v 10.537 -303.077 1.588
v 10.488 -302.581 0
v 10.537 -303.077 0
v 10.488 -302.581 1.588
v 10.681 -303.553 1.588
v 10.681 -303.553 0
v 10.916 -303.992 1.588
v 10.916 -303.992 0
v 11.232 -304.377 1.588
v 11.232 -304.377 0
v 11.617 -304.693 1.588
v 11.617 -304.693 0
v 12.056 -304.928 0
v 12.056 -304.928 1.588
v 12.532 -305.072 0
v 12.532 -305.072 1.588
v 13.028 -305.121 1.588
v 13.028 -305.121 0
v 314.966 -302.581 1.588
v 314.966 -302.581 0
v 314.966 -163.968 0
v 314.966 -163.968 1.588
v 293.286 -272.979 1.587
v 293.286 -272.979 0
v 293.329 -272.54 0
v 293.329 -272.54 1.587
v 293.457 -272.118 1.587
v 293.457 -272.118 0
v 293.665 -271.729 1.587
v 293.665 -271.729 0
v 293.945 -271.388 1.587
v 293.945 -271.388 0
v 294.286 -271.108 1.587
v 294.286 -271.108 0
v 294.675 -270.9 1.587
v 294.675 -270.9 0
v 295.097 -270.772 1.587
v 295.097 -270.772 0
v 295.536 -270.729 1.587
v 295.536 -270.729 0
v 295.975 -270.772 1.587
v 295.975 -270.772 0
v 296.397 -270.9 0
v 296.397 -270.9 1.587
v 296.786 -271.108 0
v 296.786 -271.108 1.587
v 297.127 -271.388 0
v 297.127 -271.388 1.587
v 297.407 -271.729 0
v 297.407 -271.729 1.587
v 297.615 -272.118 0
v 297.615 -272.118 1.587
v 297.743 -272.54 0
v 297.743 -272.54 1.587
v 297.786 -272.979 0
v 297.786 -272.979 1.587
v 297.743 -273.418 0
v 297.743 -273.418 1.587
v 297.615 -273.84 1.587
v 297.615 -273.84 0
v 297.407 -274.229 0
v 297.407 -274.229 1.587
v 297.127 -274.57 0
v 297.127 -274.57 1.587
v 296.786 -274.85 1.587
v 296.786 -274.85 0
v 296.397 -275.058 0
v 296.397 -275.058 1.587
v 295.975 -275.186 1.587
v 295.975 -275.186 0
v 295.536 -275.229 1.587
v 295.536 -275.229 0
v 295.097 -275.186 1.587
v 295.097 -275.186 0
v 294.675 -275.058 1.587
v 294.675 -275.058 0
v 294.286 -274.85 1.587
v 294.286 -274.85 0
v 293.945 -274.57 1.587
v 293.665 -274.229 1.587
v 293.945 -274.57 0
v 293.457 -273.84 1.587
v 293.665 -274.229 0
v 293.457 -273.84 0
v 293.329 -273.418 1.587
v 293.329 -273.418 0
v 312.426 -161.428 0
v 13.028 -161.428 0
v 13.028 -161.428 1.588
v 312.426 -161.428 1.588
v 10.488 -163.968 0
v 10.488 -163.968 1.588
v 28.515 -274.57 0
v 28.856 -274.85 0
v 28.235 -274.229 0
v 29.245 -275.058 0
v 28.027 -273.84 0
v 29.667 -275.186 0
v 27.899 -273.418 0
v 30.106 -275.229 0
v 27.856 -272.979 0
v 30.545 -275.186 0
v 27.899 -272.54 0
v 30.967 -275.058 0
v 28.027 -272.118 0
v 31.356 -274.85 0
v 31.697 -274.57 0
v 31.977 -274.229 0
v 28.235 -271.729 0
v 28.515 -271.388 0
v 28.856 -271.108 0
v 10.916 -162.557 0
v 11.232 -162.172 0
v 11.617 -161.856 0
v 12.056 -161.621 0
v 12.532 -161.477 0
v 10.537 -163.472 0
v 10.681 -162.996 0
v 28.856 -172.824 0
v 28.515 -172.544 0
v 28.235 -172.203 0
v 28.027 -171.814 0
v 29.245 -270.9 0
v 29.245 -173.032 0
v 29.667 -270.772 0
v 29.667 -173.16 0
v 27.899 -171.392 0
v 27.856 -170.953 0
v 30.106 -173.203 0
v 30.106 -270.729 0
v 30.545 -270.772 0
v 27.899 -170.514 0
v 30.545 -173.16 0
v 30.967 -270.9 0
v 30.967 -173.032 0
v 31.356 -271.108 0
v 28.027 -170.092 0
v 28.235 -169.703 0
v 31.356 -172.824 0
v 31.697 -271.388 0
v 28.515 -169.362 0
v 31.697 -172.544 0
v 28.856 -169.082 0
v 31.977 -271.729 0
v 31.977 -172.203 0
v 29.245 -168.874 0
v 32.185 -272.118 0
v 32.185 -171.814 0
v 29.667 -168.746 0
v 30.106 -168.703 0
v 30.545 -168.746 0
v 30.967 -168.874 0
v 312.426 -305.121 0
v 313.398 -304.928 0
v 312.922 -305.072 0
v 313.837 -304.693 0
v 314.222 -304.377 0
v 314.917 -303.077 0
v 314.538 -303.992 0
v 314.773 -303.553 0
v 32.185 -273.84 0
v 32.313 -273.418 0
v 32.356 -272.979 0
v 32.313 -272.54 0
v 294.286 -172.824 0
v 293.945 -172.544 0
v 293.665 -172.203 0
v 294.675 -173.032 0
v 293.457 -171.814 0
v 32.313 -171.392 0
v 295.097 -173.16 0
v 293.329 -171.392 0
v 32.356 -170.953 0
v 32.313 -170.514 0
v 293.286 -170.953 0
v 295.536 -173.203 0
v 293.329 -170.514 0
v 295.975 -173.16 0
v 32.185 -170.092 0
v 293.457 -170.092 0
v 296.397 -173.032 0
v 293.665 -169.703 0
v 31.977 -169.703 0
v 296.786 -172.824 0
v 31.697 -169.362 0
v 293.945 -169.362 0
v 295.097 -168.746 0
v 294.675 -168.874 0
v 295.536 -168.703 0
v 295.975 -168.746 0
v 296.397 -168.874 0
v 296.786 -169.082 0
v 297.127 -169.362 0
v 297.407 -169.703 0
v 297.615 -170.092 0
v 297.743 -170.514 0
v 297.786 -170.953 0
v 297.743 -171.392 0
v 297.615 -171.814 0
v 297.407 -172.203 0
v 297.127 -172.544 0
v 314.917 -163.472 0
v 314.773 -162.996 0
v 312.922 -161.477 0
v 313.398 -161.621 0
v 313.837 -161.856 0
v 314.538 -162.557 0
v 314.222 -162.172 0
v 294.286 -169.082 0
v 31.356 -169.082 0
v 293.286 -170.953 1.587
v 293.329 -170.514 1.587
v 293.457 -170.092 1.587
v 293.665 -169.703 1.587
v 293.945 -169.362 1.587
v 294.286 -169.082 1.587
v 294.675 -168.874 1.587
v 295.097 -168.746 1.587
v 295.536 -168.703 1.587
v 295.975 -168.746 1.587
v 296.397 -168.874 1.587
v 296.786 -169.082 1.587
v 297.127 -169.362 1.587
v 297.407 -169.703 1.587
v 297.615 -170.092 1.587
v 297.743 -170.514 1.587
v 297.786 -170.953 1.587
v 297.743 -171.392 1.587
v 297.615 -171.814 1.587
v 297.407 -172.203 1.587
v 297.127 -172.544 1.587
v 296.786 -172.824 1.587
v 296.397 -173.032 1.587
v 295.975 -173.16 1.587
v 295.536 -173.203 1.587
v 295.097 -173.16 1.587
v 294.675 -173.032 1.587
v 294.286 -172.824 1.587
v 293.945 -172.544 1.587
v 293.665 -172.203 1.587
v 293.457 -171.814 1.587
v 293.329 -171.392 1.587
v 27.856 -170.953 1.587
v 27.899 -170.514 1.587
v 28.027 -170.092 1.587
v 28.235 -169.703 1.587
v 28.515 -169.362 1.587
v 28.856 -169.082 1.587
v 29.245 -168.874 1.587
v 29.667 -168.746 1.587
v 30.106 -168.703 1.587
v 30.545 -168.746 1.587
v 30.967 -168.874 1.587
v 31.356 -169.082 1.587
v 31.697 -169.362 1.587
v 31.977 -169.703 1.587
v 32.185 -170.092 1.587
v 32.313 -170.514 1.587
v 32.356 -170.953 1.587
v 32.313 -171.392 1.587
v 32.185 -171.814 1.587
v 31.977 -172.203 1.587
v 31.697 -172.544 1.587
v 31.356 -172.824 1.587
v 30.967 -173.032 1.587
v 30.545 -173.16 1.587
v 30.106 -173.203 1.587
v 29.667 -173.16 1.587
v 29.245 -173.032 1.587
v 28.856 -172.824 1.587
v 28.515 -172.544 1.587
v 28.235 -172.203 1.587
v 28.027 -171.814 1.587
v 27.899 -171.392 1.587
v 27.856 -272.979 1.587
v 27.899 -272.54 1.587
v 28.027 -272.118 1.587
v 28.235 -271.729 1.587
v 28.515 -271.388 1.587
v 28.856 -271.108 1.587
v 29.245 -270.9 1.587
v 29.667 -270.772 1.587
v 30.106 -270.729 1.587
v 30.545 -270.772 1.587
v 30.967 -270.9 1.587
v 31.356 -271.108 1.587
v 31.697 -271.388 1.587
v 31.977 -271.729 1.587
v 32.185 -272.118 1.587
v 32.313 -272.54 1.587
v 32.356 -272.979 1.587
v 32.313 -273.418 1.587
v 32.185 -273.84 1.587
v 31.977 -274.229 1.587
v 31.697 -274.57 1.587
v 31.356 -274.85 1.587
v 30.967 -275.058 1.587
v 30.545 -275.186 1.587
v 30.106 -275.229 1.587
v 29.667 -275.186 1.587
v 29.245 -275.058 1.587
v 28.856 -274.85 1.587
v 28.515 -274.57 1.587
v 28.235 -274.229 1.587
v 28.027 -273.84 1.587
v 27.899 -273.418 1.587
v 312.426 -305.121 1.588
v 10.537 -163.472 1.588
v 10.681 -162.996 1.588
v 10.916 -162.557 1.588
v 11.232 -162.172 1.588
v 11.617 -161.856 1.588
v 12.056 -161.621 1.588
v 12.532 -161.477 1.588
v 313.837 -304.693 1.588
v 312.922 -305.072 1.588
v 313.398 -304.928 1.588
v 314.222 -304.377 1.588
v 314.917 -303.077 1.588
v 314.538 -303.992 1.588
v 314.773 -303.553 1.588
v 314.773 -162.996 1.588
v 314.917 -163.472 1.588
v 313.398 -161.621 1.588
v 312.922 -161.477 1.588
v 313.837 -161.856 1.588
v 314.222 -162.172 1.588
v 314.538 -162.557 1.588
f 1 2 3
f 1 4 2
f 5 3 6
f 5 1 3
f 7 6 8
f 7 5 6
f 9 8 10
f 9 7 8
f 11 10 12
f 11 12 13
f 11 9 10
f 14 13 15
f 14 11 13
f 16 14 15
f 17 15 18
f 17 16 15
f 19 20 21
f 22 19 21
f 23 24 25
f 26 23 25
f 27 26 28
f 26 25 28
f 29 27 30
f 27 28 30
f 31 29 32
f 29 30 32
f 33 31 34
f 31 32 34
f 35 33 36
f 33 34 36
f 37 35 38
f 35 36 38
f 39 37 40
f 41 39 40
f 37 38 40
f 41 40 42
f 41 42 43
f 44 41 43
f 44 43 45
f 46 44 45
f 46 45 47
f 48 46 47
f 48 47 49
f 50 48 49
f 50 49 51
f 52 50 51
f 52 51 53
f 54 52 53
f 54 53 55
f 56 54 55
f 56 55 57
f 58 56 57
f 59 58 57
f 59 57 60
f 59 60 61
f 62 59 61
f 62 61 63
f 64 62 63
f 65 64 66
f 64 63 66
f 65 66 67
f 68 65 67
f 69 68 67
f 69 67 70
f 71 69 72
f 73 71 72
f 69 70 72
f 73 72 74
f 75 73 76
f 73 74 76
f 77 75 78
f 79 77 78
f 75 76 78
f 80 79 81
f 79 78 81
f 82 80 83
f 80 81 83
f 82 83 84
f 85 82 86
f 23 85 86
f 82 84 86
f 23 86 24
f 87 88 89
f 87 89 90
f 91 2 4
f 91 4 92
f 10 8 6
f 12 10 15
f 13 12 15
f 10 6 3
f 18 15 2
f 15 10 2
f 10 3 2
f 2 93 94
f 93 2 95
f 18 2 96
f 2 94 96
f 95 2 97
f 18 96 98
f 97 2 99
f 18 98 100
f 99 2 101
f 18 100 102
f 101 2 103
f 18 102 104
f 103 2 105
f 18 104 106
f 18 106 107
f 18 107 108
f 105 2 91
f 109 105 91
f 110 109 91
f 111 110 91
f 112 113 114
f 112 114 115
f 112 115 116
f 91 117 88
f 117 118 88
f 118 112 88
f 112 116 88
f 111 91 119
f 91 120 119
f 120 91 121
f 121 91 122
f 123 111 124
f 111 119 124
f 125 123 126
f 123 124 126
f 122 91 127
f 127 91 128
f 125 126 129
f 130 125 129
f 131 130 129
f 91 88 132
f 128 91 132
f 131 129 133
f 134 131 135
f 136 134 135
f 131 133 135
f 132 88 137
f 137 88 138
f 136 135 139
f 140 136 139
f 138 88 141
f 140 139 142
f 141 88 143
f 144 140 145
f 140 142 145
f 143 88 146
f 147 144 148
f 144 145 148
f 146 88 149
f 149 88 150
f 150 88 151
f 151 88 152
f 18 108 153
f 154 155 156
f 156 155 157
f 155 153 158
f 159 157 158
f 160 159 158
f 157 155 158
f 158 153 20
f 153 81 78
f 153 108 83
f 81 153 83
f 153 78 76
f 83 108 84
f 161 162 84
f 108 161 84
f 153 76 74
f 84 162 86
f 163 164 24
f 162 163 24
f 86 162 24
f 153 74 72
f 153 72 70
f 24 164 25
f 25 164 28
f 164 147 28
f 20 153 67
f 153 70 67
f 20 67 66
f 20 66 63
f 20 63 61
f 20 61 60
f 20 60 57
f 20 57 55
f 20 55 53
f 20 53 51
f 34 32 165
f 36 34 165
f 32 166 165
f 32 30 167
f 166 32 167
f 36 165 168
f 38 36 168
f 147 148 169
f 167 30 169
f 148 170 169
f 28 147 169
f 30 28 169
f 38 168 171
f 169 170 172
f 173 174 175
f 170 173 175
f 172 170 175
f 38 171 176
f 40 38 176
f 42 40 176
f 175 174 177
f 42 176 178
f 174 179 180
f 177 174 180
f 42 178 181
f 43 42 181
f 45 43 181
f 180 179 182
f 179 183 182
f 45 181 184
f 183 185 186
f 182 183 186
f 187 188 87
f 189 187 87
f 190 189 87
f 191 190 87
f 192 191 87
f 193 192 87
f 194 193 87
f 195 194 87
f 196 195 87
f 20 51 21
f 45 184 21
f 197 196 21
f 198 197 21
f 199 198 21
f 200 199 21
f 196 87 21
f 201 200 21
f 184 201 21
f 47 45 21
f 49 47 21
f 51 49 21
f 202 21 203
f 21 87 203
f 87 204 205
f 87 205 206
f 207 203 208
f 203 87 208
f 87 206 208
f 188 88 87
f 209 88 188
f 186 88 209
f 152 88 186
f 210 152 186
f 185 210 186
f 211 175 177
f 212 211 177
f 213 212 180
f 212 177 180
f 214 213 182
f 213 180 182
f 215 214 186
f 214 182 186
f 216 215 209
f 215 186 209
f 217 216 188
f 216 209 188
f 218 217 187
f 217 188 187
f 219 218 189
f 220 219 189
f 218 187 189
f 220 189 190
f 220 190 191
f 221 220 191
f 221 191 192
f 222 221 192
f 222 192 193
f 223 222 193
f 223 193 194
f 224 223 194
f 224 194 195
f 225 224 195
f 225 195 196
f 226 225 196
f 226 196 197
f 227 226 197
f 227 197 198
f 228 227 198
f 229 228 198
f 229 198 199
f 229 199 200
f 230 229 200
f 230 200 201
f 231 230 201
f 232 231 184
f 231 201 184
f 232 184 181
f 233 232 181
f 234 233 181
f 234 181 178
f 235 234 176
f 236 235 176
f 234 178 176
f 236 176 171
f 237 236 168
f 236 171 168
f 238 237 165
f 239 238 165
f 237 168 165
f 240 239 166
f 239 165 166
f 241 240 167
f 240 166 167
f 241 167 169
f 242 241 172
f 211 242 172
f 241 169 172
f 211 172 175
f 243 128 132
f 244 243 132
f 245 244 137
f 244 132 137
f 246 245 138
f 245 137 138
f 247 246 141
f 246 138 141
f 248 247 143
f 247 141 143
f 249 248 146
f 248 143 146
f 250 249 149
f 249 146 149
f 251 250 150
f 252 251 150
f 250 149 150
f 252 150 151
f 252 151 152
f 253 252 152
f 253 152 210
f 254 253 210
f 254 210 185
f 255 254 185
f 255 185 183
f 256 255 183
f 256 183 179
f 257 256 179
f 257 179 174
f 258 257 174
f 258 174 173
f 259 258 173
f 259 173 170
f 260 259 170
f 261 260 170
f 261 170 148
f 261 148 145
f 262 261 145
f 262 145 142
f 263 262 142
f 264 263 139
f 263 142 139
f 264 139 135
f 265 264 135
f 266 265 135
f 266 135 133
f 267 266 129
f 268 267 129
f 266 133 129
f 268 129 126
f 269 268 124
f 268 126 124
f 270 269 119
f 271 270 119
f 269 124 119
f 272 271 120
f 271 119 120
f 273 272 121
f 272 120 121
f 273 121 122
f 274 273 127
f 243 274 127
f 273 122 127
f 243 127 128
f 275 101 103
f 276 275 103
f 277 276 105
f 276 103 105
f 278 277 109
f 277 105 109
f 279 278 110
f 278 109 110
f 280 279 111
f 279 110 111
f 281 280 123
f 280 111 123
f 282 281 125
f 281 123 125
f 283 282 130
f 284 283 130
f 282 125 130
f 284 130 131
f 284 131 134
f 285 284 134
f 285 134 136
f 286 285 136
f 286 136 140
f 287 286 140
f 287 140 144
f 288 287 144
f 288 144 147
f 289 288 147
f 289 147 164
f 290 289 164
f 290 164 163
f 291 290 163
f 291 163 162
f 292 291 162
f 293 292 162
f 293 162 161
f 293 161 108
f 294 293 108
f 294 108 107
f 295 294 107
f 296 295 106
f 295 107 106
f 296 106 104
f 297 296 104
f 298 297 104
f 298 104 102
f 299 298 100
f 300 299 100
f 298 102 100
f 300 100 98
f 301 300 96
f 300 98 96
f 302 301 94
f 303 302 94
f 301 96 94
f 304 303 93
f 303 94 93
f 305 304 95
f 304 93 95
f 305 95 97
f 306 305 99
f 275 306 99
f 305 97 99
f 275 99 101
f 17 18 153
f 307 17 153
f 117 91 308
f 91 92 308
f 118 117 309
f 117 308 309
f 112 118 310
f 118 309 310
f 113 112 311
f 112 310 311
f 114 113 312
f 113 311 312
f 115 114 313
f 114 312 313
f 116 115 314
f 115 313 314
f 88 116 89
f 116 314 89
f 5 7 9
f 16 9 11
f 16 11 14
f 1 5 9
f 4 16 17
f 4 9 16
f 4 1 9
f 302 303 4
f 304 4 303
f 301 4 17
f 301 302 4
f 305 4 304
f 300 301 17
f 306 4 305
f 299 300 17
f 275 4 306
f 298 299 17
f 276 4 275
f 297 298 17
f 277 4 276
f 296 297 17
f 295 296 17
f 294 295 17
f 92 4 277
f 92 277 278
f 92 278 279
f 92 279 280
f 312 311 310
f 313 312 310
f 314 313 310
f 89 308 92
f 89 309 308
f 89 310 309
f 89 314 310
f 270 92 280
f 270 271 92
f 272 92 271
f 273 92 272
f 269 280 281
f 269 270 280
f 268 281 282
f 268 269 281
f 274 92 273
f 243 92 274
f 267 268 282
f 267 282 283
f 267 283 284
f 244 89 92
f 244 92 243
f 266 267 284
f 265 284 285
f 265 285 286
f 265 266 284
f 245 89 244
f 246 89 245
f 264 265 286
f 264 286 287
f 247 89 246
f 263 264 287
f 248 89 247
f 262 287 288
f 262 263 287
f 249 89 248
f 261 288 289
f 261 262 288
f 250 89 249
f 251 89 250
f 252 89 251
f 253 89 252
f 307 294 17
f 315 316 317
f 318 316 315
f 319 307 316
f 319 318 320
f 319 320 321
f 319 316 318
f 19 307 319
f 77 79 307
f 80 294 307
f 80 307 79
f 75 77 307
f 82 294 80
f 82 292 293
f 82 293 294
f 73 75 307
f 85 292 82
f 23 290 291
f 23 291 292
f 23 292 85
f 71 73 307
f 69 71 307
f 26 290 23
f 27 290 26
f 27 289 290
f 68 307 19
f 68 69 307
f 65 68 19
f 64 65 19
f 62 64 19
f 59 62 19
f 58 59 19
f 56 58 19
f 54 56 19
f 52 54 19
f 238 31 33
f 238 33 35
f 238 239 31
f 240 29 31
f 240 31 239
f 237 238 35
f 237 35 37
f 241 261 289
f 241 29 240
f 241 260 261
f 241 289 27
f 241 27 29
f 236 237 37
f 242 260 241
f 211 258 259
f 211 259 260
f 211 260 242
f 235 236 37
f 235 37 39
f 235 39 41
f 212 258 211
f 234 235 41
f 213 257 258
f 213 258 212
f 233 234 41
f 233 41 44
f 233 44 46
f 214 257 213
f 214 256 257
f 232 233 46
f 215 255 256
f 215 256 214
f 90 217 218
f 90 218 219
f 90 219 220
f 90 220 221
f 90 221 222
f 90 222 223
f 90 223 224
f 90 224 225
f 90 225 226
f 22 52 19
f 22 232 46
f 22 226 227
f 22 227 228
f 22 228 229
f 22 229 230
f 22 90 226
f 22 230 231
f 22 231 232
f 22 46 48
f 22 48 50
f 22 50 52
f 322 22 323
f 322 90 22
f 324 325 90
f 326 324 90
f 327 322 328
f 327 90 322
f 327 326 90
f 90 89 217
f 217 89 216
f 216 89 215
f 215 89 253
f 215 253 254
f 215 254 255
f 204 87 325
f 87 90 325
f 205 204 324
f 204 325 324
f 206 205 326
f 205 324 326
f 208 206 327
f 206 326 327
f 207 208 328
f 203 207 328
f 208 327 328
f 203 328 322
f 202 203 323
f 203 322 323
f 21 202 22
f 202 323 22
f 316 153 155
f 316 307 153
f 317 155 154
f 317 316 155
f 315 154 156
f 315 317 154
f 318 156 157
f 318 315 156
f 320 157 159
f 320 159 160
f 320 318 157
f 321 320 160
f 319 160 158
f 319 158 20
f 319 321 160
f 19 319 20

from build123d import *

# Parameters (mm, degrees)
SKETCH1_W            = 304.478126018
SKETCH1_H            = 143.693200147
SKETCH1_R            = 1.963769259
SKETCH1_R_2          = 1.779821827
SKETCH1_R_3          = 1.61224473
SKETCH1_R_4          = 1.682415614
BOSS_EXTRUDE1_DEPTH  = 1.5875
FILLET1_R            = 2.54
M4_CLEARANCE_HOLE1_D = 4.5


with BuildPart() as part:
    # Sketch1 → Boss-Extrude1 (new body)
    with BuildSketch(Plane.XY):
        with Locations((162.727004442, -233.274517622)):
            Rectangle(SKETCH1_W, SKETCH1_H)
        with Locations((30.106067449, -170.952944133)):
            Circle(SKETCH1_R, mode=Mode.SUBTRACT)
        with Locations((295.536067449, -170.952944133)):
            Circle(SKETCH1_R_2, mode=Mode.SUBTRACT)
        with Locations((295.536067449, -272.978890964)):
            Circle(SKETCH1_R_3, mode=Mode.SUBTRACT)
        with Locations((30.106067449, -272.978890964)):
            Circle(SKETCH1_R_4, mode=Mode.SUBTRACT)
    extrude(amount=BOSS_EXTRUDE1_DEPTH)

    # Fillet1
    fillet1_edges = [part.edges().sort_by_distance(p)[0] for p in [
        (10.487941433, -161.427917548, 0.79375),
        (314.966067451, -161.427917548, 0.79375),
        (314.966067451, -305.121117695, 0.79375),
        (10.487941433, -305.121117695, 0.79375),
    ]]
    fillet(fillet1_edges, radius=FILLET1_R)

    # M4 Clearance Hole1 (through all)
    with Locations(Plane.XY.offset(1.5875)):
        with Locations((30.106067449, -170.952944133), (30.106067449, -272.978890964), (295.536067449, -170.952944133), (295.536067449, -272.978890964)):
            Hole(M4_CLEARANCE_HOLE1_D / 2)


solid = part.part
